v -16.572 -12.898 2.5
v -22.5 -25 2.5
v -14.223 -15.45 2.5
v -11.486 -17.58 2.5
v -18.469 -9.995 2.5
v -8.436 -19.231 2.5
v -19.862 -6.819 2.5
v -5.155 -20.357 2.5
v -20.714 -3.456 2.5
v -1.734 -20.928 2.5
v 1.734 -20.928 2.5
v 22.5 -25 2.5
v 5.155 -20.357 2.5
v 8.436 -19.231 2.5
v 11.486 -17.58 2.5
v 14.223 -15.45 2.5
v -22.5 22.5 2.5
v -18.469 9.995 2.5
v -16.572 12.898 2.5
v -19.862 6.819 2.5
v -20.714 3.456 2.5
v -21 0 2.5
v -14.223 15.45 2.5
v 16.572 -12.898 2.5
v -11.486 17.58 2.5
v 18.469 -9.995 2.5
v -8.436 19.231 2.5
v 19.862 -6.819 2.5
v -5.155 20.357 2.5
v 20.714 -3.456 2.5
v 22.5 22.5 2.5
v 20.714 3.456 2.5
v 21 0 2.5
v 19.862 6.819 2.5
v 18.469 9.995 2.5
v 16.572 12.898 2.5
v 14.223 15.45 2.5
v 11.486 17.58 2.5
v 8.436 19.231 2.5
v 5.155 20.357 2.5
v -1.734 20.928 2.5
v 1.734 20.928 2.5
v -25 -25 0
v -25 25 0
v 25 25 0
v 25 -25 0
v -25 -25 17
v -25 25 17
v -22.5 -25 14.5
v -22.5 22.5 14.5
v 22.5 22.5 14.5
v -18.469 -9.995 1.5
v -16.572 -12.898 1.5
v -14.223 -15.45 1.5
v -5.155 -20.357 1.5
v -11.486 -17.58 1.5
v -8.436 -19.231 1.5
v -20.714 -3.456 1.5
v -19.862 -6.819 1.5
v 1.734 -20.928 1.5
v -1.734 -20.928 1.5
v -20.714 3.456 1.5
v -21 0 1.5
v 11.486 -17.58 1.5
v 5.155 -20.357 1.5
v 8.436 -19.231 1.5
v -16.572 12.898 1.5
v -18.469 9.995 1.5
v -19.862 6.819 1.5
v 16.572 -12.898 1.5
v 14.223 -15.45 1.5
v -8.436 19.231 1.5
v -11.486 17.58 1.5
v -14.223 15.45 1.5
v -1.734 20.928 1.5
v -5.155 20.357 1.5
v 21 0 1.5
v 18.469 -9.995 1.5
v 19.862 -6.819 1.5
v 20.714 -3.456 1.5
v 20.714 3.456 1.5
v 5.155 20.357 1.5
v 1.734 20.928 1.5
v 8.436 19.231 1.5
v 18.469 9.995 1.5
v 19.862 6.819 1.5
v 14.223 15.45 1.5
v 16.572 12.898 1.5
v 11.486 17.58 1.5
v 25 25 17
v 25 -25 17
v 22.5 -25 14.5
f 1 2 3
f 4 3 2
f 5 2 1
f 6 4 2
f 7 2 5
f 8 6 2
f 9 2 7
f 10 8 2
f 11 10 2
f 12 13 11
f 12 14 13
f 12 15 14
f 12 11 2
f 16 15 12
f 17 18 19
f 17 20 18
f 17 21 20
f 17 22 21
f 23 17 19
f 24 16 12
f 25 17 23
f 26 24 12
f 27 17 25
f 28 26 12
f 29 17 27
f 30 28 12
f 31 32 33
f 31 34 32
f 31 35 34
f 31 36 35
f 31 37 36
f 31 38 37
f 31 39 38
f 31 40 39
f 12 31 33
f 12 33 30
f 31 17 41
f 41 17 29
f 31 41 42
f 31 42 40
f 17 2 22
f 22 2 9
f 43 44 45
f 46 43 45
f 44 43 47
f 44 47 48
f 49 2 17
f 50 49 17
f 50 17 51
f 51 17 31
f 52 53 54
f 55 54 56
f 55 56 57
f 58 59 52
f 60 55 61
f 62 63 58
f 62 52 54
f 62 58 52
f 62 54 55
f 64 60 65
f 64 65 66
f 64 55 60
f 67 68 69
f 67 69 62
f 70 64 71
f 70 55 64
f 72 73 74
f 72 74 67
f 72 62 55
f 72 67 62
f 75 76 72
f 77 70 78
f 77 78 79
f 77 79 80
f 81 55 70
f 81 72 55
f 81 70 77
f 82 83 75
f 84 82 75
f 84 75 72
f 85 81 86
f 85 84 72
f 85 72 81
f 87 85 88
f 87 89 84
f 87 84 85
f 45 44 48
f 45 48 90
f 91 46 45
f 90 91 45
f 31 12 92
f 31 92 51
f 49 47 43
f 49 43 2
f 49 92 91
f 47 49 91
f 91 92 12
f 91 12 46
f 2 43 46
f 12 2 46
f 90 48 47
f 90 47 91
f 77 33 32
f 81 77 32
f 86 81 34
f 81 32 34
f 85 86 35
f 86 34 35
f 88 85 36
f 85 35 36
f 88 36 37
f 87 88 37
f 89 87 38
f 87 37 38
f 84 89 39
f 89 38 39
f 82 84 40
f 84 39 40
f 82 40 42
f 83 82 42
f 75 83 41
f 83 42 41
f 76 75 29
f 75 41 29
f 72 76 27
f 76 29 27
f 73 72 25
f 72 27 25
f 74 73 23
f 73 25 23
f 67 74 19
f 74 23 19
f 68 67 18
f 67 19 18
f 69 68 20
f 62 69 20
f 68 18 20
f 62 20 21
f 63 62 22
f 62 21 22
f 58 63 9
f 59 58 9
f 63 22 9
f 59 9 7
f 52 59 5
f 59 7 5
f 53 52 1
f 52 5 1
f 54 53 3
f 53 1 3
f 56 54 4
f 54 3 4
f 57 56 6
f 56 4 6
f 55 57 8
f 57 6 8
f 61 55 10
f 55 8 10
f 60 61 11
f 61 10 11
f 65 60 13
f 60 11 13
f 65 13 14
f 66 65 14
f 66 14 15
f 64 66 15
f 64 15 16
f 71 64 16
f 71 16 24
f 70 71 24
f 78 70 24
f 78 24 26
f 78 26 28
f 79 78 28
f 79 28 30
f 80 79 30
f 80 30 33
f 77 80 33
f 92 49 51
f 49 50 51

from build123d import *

# Parameters (mm, degrees)
F0_W     = 50
F0_H     = 50
F1_DEPTH = 17
F2_T     = -2.5
F3_R     = 21
F4_DEPTH = 1


with BuildPart() as f1:
    # F0 (on Top) → F1 (new body)
    with BuildSketch(Plane.XY):
        Rectangle(F0_W, F0_H)
    extrude(amount=F1_DEPTH)

    # F2
    f2_openings = [f1.faces().sort_by_distance(p)[0] for p in [
        (0, -25, 8.5),
    ]]
    offset(amount=F2_T, openings=f2_openings)

    # F3 (on face) → F4 (cut)
    with BuildSketch(Plane.XY.offset(2.5)):
        Circle(F3_R)
    extrude(amount=-F4_DEPTH, mode=Mode.SUBTRACT)


solid = f1.part
